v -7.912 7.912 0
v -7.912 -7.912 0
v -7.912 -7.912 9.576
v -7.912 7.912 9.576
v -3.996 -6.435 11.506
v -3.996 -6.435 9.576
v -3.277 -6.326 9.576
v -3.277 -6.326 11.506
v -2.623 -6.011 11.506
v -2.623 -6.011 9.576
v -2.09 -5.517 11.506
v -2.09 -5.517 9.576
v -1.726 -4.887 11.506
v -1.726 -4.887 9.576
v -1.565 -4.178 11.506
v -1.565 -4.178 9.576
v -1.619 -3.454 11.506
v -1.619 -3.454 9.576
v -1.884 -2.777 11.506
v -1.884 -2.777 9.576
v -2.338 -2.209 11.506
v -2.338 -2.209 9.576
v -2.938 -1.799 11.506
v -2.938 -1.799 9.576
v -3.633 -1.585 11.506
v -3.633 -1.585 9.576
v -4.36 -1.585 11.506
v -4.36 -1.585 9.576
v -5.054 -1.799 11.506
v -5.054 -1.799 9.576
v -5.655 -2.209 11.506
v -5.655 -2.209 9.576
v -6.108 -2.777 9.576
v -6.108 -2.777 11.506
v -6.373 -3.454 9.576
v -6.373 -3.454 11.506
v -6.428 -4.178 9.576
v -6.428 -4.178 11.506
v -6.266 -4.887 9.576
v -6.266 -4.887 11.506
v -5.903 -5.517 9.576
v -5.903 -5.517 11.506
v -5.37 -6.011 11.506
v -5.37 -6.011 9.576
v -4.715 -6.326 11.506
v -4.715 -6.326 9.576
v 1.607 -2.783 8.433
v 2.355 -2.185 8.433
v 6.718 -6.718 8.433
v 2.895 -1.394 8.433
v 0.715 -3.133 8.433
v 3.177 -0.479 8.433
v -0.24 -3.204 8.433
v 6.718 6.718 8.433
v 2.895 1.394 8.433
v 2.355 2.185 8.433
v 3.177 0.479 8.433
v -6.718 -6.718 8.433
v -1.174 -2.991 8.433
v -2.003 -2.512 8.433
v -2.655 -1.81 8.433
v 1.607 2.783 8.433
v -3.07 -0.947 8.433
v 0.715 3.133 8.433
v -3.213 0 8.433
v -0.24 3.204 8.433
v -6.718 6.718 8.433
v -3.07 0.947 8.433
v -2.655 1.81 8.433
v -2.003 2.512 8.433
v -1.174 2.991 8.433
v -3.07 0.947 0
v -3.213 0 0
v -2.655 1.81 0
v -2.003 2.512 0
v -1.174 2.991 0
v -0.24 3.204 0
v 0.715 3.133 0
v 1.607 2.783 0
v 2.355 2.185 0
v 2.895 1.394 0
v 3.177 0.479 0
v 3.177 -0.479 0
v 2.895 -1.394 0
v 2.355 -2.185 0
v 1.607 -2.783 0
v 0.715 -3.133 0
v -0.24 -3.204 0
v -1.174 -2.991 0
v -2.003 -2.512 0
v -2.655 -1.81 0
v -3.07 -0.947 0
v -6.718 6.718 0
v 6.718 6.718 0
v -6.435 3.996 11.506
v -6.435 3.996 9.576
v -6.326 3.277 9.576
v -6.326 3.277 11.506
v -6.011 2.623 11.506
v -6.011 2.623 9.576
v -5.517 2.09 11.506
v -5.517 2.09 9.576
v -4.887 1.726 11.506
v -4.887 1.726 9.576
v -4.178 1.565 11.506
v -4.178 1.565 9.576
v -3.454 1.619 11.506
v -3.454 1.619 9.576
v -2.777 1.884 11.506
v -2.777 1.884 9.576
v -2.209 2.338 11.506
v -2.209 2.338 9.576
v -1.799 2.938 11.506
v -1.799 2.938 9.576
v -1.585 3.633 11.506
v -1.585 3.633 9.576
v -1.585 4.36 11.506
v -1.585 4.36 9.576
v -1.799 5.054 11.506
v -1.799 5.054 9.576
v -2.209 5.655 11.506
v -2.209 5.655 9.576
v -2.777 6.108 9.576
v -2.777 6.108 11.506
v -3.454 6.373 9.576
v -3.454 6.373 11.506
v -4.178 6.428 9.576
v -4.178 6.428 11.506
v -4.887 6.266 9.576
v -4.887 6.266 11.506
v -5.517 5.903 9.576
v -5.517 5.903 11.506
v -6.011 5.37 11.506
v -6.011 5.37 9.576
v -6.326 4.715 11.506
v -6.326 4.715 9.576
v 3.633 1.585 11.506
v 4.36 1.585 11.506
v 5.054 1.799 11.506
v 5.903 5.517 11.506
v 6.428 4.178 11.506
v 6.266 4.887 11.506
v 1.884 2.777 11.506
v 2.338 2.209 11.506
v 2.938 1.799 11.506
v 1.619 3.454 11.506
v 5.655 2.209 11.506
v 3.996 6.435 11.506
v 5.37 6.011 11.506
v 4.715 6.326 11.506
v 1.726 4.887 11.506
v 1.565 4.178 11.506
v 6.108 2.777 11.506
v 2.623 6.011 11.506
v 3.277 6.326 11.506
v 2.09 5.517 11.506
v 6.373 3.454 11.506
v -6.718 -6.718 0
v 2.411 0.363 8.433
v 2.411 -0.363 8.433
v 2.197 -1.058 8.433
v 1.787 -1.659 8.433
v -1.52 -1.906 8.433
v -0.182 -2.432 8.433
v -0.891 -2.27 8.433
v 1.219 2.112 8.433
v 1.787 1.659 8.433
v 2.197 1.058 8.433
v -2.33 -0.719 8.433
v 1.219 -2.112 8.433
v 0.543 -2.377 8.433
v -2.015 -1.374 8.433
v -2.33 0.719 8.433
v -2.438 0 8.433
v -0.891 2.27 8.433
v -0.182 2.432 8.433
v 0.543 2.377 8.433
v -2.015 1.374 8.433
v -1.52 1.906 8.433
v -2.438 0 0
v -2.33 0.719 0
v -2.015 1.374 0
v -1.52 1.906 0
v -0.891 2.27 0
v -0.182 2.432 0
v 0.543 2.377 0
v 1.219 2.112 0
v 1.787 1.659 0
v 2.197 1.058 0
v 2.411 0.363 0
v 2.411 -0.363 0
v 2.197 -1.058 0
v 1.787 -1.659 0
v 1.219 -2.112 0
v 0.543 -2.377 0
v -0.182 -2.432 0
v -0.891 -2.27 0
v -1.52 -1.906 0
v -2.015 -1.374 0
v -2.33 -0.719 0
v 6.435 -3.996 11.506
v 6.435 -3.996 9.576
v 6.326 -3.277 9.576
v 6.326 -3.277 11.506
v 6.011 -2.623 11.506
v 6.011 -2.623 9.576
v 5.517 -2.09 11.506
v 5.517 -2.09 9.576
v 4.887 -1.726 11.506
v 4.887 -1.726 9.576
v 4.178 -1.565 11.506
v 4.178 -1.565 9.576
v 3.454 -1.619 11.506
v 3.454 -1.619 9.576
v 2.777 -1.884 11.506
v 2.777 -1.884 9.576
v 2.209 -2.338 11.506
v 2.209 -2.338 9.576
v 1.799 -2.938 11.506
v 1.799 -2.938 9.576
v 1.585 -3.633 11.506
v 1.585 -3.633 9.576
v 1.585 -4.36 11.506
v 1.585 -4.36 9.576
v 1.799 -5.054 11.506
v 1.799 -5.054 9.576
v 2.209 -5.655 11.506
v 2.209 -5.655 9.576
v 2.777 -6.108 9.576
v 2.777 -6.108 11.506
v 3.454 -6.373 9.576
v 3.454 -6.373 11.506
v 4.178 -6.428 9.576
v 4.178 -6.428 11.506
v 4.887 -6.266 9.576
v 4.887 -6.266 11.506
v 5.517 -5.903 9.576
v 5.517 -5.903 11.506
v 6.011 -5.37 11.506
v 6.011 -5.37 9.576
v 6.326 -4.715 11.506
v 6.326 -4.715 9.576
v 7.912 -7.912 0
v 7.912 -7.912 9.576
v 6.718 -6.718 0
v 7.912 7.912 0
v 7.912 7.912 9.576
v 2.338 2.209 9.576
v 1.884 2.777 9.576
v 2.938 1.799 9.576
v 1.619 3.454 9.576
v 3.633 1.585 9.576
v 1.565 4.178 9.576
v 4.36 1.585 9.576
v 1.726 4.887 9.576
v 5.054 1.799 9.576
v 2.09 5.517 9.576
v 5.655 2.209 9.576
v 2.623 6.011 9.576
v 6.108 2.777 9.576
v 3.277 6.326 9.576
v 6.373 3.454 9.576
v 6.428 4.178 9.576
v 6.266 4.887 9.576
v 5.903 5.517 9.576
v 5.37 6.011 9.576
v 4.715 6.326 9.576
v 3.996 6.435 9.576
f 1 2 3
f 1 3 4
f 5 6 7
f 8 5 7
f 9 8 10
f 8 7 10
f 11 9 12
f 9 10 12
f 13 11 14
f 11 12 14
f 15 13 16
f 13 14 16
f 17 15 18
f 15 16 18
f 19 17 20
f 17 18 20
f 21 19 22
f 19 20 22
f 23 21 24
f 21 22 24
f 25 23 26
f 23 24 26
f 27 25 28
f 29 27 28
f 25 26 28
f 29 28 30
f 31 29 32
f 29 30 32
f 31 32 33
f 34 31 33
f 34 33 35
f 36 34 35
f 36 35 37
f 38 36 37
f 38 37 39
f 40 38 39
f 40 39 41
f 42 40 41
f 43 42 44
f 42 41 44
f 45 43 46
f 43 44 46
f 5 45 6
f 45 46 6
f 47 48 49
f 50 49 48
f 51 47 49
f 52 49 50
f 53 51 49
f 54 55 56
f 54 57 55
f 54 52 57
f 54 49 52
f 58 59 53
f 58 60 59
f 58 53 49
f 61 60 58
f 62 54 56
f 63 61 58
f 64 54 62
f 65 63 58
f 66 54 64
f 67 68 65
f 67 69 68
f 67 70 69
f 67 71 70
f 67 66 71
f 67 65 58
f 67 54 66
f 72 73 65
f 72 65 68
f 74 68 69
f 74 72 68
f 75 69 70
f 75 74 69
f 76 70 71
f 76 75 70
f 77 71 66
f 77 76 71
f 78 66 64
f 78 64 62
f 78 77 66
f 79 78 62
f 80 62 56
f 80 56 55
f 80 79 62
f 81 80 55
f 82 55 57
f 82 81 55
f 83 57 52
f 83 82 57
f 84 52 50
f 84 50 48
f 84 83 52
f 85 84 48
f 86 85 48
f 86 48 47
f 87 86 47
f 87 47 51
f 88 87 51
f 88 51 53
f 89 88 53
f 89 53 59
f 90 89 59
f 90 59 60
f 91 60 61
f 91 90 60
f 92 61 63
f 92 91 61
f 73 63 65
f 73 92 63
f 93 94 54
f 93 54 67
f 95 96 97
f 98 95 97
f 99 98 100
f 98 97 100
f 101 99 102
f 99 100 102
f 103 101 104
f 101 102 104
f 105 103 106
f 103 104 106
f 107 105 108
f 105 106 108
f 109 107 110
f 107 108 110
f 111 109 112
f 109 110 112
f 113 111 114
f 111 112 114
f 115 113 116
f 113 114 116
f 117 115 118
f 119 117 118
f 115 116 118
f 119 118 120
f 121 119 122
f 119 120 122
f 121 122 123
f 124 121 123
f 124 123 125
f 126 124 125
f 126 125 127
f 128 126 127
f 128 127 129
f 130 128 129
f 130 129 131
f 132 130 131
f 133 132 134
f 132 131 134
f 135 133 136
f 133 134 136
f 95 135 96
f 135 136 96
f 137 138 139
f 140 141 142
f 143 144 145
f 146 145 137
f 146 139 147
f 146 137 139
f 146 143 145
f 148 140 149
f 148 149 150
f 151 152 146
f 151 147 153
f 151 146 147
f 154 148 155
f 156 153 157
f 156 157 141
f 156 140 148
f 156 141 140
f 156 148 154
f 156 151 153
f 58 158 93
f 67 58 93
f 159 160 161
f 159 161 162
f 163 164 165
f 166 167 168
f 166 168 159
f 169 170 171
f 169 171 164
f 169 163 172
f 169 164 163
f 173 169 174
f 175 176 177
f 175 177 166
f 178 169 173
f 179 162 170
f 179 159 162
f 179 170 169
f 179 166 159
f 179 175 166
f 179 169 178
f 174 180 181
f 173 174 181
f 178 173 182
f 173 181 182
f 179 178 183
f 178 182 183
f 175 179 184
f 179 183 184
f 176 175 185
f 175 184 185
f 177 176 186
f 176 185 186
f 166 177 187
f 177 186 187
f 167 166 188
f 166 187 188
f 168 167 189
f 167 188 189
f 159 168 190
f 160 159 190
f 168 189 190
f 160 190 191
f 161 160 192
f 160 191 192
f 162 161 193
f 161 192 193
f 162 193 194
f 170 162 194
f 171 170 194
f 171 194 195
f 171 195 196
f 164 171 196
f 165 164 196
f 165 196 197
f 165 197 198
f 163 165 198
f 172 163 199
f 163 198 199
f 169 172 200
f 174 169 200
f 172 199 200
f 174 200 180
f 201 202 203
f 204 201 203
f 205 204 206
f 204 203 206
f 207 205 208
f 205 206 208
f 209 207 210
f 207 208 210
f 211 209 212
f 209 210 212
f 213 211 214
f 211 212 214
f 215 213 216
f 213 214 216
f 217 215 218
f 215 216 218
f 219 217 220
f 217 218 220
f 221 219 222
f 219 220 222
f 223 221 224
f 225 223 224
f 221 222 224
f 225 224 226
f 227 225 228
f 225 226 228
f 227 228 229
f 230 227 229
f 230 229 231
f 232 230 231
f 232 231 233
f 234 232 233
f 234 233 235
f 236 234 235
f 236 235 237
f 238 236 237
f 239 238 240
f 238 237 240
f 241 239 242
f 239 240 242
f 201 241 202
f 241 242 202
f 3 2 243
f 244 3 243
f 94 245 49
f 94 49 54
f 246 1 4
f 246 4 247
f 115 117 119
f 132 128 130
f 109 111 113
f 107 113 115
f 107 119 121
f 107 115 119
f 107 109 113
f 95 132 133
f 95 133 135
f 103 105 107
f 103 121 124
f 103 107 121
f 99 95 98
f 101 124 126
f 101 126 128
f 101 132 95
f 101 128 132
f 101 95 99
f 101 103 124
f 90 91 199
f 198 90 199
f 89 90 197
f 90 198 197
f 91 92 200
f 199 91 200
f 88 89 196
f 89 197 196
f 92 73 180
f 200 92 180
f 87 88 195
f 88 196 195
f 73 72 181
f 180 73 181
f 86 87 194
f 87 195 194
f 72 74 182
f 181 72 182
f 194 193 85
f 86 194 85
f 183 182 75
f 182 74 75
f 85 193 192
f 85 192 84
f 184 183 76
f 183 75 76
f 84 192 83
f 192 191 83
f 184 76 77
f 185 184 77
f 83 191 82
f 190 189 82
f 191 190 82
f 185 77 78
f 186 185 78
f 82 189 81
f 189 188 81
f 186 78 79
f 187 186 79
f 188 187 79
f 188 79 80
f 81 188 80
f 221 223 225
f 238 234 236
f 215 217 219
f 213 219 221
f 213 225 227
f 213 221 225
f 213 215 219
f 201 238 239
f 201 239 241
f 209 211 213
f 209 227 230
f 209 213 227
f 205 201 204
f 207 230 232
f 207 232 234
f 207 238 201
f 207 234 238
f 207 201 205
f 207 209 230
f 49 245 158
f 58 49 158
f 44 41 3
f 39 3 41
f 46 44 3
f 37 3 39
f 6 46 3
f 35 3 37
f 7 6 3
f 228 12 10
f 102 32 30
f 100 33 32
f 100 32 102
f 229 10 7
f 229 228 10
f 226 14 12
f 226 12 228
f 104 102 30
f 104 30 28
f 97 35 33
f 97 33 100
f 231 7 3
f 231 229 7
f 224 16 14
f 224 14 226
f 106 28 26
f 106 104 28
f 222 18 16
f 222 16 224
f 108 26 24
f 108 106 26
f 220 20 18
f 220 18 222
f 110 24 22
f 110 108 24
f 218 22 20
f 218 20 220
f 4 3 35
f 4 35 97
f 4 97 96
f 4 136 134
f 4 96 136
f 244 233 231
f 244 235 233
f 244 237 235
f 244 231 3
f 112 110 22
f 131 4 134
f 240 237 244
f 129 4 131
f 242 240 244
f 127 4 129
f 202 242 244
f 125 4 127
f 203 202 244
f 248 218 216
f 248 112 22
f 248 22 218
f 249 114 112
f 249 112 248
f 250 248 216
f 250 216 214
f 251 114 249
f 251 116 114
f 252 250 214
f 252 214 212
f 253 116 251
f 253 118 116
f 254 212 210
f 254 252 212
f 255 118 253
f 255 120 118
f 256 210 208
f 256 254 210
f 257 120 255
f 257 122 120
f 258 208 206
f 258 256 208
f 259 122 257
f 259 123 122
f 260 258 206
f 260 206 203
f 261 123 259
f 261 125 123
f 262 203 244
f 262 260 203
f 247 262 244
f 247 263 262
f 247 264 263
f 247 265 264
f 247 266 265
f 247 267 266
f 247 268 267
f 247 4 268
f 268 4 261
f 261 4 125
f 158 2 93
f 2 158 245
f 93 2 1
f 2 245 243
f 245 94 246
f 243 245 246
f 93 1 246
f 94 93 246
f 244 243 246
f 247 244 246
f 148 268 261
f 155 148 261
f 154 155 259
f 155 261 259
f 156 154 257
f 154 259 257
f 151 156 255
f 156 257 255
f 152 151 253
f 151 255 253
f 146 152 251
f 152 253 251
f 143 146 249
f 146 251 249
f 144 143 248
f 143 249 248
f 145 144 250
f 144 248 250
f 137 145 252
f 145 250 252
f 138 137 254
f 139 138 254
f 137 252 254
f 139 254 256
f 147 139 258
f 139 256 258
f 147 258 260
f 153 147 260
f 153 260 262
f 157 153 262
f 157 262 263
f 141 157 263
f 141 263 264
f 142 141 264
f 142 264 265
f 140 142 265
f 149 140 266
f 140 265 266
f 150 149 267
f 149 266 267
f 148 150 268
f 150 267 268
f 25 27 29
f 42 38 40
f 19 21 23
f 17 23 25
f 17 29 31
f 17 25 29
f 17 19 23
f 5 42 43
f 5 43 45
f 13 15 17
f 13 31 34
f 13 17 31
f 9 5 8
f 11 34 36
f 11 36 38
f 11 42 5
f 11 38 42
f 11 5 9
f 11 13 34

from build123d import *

# Parameters (mm, degrees)
SKETCH1_W           = 15.8242
SKETCH1_H           = 15.8242
BOSS_EXTRUDE1_DEPTH = 9.5758
SKETCH2_W           = 13.4366
SKETCH2_H           = 13.4366
SKETCH2_R           = 3.2131
CUT_EXTRUDE1_DEPTH  = 8.4328
SKETCH3_R           = 2.4384
CUT_EXTRUDE2_DEPTH  = 8.4328
SKETCH4_R           = 2.4384
BOSS_EXTRUDE2_DEPTH = 1.9304
CIRPATTERN1_COUNT   = 4


with BuildPart() as part:
    # Sketch1 → Boss-Extrude1 (new body)
    with BuildSketch(Plane.XY):
        Rectangle(SKETCH1_W, SKETCH1_H)
    extrude(amount=BOSS_EXTRUDE1_DEPTH)

    # Sketch2 → Cut-Extrude1 (cut)
    with BuildSketch(Plane(origin=(0, 0, 0), x_dir=(-1, 0, 0), z_dir=(0, 0, -1))):
        Rectangle(SKETCH2_W, SKETCH2_H)
        Circle(SKETCH2_R, mode=Mode.SUBTRACT)
    extrude(amount=-CUT_EXTRUDE1_DEPTH, mode=Mode.SUBTRACT)

    # Sketch3 → Cut-Extrude2 (cut)
    with BuildSketch(Plane(origin=(0, 0, 0), x_dir=(-1, 0, 0), z_dir=(0, 0, -1))):
        Circle(SKETCH3_R)
    extrude(amount=-CUT_EXTRUDE2_DEPTH, mode=Mode.SUBTRACT)

    # Sketch4 → Boss-Extrude2 (add)
    with BuildSketch(Plane.XY.offset(9.5758)):
        with Locations((3.996213974, -3.996213974)):
            Circle(SKETCH4_R)
    boss_extrude2 = extrude(amount=BOSS_EXTRUDE2_DEPTH)

    # CirPattern1: Boss-Extrude2 ×4 about axis
    cirpattern1_axis = Axis((0, 0, 0), (0, 0, 1))
    for i in range(1, CIRPATTERN1_COUNT):
        add(boss_extrude2.rotate(cirpattern1_axis, i * 360 / CIRPATTERN1_COUNT))


solid = part.part
